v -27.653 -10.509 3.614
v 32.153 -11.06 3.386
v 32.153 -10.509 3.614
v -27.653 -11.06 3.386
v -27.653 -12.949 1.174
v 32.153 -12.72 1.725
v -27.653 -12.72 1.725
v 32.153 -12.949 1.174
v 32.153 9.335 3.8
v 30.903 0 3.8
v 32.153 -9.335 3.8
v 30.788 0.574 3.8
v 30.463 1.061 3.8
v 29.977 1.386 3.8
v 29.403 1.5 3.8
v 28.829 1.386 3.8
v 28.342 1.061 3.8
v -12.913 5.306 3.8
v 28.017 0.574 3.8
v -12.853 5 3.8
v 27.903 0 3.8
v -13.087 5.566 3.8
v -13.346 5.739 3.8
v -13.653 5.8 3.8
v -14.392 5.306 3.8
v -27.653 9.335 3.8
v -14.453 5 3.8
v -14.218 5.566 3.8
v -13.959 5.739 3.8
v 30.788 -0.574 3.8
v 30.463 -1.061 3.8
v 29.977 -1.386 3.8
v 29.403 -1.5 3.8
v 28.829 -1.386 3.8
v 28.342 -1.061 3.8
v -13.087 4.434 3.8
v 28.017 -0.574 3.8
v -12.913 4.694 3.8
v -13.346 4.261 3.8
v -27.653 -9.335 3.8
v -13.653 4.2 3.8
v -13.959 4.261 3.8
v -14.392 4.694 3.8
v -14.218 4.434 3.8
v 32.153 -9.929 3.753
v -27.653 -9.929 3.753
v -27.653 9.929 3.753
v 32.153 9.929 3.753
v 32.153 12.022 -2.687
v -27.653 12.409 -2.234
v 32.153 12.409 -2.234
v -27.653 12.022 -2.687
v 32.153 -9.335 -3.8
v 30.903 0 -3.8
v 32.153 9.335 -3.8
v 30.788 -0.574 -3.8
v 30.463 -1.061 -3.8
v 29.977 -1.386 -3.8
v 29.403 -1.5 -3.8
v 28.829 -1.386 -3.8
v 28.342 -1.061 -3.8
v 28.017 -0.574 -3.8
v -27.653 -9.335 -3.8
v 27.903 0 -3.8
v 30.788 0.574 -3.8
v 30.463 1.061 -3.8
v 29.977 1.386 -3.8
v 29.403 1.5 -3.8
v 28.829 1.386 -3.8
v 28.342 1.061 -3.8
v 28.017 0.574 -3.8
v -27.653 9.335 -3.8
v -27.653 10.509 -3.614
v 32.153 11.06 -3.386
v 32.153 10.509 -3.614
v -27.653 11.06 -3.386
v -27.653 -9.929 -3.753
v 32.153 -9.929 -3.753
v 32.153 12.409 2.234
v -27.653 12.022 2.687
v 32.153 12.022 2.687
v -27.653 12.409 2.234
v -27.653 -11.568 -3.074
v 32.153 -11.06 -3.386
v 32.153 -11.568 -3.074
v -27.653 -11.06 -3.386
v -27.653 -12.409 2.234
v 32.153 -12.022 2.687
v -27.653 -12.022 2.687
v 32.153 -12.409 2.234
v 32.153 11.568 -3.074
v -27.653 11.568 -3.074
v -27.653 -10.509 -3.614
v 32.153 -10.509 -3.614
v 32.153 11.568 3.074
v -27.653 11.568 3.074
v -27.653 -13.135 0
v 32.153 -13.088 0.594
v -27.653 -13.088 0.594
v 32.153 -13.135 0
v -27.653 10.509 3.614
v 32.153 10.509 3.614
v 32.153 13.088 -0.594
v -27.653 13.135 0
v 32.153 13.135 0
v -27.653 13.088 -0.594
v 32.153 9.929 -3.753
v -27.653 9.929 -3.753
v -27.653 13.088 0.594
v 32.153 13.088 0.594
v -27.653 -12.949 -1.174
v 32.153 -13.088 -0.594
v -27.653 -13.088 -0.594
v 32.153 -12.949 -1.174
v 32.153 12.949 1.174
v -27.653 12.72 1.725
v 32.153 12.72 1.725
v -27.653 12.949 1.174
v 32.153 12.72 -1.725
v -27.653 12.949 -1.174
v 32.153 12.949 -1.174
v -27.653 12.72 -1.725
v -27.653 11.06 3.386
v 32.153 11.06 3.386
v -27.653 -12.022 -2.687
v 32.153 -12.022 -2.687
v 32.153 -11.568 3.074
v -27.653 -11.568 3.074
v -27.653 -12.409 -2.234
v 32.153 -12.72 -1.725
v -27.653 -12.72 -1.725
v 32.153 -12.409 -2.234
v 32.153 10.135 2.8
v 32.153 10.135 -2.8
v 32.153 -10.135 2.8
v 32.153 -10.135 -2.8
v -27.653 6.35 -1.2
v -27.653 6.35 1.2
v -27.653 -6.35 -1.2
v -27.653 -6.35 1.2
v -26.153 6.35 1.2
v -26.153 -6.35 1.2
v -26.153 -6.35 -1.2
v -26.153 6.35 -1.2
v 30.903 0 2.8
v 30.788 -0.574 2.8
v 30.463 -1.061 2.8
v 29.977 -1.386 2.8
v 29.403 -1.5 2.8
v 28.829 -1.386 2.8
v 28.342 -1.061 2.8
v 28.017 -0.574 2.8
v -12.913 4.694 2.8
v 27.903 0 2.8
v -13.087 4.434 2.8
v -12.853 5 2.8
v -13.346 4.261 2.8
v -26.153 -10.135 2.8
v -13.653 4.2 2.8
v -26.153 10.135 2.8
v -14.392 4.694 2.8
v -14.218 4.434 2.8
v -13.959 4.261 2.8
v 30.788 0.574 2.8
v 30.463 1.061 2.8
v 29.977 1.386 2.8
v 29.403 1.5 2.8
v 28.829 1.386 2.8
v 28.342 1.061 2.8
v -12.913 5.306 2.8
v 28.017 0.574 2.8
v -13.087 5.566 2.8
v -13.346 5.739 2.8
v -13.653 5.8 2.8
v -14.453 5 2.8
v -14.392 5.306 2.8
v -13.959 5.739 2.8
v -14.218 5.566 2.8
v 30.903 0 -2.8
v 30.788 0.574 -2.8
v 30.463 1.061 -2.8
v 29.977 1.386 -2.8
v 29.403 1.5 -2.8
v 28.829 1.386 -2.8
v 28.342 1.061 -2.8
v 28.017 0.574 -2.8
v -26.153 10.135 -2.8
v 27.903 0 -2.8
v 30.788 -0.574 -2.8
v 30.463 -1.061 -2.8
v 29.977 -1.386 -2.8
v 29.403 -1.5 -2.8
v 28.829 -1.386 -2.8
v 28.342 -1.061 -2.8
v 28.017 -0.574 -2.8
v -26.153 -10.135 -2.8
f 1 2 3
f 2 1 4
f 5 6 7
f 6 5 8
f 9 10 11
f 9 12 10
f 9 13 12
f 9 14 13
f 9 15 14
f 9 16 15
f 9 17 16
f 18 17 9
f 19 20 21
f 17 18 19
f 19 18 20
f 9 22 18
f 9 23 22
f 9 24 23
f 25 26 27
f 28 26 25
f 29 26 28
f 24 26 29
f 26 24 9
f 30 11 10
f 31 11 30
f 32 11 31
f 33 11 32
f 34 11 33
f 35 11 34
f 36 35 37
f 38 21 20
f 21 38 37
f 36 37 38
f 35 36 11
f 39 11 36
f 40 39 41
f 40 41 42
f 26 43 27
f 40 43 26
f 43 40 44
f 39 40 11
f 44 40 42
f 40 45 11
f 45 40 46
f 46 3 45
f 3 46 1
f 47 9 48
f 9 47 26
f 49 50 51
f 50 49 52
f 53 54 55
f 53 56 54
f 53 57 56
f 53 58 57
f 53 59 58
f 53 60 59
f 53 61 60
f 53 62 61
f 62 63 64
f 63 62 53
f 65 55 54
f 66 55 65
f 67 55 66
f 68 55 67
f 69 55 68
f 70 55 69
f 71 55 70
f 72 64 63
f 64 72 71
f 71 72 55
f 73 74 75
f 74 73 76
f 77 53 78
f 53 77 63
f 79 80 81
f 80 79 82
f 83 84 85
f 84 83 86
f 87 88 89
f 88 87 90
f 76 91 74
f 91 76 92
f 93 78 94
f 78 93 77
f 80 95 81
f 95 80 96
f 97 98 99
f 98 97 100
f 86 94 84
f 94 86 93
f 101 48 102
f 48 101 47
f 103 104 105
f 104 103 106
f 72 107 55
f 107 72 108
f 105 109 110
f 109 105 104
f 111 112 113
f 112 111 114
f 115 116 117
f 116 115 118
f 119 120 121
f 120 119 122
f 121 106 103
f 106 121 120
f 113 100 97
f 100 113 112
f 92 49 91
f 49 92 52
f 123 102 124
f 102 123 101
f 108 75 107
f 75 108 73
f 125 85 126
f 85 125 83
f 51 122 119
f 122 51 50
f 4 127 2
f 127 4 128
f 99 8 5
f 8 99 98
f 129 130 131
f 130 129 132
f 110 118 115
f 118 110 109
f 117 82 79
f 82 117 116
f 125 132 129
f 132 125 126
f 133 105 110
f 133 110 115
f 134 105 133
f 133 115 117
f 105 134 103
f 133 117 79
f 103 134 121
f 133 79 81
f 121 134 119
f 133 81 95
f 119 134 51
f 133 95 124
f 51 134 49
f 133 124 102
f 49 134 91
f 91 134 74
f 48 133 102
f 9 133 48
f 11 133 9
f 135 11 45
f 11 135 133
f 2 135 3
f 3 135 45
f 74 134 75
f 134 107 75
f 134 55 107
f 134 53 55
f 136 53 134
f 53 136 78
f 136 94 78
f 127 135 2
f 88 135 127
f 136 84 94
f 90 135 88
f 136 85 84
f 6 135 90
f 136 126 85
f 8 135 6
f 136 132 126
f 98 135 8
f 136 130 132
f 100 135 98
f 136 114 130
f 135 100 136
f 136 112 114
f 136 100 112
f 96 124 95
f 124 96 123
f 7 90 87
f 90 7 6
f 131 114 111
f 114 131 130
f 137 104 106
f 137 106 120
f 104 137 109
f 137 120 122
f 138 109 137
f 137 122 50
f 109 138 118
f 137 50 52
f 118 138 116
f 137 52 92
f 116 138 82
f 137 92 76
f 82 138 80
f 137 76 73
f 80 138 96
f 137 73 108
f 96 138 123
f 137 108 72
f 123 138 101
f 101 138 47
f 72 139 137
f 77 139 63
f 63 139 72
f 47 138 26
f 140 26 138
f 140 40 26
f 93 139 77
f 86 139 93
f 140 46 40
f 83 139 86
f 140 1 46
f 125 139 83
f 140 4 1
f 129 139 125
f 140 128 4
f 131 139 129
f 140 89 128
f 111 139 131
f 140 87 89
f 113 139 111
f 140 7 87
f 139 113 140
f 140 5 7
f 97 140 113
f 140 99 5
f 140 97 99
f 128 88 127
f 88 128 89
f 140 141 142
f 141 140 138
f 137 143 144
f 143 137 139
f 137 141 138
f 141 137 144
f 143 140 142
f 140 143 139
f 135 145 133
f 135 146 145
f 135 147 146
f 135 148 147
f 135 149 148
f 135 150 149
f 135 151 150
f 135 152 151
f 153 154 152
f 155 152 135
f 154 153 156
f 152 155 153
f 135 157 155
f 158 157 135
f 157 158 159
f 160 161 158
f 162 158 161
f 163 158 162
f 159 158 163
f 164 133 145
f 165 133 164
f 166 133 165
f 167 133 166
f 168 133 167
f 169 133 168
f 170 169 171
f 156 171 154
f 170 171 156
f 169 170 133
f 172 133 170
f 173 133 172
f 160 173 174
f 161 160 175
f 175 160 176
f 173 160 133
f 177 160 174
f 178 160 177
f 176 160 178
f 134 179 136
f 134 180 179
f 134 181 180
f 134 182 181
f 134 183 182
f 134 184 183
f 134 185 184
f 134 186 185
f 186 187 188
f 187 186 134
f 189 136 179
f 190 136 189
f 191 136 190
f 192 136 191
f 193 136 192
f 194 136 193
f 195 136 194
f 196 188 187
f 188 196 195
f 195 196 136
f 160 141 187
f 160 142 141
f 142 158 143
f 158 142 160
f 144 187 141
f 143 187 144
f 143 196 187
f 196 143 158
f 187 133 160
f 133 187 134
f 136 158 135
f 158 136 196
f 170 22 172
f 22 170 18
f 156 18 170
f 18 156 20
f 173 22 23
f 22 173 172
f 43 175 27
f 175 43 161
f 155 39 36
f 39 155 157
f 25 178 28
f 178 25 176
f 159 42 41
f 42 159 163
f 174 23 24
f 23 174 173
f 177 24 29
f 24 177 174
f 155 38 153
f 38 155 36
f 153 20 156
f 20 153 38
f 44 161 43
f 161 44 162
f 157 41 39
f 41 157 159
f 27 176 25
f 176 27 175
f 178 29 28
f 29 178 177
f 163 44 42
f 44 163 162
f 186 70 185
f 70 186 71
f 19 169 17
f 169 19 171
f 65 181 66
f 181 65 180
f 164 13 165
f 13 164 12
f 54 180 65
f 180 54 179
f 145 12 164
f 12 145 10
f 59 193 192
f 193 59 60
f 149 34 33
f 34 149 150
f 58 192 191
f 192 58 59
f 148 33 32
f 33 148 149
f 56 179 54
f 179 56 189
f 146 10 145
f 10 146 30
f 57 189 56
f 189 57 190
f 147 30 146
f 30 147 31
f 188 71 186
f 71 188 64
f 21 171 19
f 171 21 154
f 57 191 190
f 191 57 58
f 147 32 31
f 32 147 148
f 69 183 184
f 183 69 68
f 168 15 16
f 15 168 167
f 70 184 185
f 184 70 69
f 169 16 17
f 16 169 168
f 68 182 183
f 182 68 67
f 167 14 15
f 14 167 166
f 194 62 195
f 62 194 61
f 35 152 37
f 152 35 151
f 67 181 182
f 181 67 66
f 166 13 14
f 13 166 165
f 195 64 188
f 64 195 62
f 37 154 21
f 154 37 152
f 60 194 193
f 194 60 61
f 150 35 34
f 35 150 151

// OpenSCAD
inch=25.4;

wall = 1.0;  // wall thickness
buffer = 4.5;  // keychain hole buffer
board = [2.138*inch, 0.798*inch, 5.6]; // board size

module pill(dims) {
     x = dims[0];
     y = dims[1];
     r = y/2;
     union() {
          square([x - 2*r, y], center=true);
          for (i = [-1, 1])
          translate([i * (x - 2*r) / 2, 0])
          circle(r);
     }
}

module case() {
    difference() {
        translate([buffer/2, 0, 0])
        difference() {
             //cube(board + [wall + buffer, 2*wall, 2*wall], center=true);
             rotate([90, 0, 90])
             linear_extrude(board[0] + wall + buffer, center=true)
             pill([board[1] + 2*wall, board[2] + 2*wall] + [4,0], $fn=40);

             // USB slot
             cube([2*board[0], 0.5*inch, 2.4], center=true);

             // board
             translate([wall, 0, 0])
             cube(board + [buffer, 0, 0], center=true);
        }

        // LED hole
        translate([-board[0]/2 + 13.5, 5, 0])
        cylinder(r=0.8,, h=2*board[2], $fn=16);

        translate([board[0]/2 + buffer/2, 0, 0])
        cylinder(r=3/2, h=2*board[2], $fn=16, center=true);
    }
}

module board() {
     conn_len = 0.3*inch;
     cube(board, center=true);
     translate([-conn_len,0,0])
     cube([board[0]+conn_len, 0.45*inch, 1.4], center=true);
}

case();
//color("black") board();
